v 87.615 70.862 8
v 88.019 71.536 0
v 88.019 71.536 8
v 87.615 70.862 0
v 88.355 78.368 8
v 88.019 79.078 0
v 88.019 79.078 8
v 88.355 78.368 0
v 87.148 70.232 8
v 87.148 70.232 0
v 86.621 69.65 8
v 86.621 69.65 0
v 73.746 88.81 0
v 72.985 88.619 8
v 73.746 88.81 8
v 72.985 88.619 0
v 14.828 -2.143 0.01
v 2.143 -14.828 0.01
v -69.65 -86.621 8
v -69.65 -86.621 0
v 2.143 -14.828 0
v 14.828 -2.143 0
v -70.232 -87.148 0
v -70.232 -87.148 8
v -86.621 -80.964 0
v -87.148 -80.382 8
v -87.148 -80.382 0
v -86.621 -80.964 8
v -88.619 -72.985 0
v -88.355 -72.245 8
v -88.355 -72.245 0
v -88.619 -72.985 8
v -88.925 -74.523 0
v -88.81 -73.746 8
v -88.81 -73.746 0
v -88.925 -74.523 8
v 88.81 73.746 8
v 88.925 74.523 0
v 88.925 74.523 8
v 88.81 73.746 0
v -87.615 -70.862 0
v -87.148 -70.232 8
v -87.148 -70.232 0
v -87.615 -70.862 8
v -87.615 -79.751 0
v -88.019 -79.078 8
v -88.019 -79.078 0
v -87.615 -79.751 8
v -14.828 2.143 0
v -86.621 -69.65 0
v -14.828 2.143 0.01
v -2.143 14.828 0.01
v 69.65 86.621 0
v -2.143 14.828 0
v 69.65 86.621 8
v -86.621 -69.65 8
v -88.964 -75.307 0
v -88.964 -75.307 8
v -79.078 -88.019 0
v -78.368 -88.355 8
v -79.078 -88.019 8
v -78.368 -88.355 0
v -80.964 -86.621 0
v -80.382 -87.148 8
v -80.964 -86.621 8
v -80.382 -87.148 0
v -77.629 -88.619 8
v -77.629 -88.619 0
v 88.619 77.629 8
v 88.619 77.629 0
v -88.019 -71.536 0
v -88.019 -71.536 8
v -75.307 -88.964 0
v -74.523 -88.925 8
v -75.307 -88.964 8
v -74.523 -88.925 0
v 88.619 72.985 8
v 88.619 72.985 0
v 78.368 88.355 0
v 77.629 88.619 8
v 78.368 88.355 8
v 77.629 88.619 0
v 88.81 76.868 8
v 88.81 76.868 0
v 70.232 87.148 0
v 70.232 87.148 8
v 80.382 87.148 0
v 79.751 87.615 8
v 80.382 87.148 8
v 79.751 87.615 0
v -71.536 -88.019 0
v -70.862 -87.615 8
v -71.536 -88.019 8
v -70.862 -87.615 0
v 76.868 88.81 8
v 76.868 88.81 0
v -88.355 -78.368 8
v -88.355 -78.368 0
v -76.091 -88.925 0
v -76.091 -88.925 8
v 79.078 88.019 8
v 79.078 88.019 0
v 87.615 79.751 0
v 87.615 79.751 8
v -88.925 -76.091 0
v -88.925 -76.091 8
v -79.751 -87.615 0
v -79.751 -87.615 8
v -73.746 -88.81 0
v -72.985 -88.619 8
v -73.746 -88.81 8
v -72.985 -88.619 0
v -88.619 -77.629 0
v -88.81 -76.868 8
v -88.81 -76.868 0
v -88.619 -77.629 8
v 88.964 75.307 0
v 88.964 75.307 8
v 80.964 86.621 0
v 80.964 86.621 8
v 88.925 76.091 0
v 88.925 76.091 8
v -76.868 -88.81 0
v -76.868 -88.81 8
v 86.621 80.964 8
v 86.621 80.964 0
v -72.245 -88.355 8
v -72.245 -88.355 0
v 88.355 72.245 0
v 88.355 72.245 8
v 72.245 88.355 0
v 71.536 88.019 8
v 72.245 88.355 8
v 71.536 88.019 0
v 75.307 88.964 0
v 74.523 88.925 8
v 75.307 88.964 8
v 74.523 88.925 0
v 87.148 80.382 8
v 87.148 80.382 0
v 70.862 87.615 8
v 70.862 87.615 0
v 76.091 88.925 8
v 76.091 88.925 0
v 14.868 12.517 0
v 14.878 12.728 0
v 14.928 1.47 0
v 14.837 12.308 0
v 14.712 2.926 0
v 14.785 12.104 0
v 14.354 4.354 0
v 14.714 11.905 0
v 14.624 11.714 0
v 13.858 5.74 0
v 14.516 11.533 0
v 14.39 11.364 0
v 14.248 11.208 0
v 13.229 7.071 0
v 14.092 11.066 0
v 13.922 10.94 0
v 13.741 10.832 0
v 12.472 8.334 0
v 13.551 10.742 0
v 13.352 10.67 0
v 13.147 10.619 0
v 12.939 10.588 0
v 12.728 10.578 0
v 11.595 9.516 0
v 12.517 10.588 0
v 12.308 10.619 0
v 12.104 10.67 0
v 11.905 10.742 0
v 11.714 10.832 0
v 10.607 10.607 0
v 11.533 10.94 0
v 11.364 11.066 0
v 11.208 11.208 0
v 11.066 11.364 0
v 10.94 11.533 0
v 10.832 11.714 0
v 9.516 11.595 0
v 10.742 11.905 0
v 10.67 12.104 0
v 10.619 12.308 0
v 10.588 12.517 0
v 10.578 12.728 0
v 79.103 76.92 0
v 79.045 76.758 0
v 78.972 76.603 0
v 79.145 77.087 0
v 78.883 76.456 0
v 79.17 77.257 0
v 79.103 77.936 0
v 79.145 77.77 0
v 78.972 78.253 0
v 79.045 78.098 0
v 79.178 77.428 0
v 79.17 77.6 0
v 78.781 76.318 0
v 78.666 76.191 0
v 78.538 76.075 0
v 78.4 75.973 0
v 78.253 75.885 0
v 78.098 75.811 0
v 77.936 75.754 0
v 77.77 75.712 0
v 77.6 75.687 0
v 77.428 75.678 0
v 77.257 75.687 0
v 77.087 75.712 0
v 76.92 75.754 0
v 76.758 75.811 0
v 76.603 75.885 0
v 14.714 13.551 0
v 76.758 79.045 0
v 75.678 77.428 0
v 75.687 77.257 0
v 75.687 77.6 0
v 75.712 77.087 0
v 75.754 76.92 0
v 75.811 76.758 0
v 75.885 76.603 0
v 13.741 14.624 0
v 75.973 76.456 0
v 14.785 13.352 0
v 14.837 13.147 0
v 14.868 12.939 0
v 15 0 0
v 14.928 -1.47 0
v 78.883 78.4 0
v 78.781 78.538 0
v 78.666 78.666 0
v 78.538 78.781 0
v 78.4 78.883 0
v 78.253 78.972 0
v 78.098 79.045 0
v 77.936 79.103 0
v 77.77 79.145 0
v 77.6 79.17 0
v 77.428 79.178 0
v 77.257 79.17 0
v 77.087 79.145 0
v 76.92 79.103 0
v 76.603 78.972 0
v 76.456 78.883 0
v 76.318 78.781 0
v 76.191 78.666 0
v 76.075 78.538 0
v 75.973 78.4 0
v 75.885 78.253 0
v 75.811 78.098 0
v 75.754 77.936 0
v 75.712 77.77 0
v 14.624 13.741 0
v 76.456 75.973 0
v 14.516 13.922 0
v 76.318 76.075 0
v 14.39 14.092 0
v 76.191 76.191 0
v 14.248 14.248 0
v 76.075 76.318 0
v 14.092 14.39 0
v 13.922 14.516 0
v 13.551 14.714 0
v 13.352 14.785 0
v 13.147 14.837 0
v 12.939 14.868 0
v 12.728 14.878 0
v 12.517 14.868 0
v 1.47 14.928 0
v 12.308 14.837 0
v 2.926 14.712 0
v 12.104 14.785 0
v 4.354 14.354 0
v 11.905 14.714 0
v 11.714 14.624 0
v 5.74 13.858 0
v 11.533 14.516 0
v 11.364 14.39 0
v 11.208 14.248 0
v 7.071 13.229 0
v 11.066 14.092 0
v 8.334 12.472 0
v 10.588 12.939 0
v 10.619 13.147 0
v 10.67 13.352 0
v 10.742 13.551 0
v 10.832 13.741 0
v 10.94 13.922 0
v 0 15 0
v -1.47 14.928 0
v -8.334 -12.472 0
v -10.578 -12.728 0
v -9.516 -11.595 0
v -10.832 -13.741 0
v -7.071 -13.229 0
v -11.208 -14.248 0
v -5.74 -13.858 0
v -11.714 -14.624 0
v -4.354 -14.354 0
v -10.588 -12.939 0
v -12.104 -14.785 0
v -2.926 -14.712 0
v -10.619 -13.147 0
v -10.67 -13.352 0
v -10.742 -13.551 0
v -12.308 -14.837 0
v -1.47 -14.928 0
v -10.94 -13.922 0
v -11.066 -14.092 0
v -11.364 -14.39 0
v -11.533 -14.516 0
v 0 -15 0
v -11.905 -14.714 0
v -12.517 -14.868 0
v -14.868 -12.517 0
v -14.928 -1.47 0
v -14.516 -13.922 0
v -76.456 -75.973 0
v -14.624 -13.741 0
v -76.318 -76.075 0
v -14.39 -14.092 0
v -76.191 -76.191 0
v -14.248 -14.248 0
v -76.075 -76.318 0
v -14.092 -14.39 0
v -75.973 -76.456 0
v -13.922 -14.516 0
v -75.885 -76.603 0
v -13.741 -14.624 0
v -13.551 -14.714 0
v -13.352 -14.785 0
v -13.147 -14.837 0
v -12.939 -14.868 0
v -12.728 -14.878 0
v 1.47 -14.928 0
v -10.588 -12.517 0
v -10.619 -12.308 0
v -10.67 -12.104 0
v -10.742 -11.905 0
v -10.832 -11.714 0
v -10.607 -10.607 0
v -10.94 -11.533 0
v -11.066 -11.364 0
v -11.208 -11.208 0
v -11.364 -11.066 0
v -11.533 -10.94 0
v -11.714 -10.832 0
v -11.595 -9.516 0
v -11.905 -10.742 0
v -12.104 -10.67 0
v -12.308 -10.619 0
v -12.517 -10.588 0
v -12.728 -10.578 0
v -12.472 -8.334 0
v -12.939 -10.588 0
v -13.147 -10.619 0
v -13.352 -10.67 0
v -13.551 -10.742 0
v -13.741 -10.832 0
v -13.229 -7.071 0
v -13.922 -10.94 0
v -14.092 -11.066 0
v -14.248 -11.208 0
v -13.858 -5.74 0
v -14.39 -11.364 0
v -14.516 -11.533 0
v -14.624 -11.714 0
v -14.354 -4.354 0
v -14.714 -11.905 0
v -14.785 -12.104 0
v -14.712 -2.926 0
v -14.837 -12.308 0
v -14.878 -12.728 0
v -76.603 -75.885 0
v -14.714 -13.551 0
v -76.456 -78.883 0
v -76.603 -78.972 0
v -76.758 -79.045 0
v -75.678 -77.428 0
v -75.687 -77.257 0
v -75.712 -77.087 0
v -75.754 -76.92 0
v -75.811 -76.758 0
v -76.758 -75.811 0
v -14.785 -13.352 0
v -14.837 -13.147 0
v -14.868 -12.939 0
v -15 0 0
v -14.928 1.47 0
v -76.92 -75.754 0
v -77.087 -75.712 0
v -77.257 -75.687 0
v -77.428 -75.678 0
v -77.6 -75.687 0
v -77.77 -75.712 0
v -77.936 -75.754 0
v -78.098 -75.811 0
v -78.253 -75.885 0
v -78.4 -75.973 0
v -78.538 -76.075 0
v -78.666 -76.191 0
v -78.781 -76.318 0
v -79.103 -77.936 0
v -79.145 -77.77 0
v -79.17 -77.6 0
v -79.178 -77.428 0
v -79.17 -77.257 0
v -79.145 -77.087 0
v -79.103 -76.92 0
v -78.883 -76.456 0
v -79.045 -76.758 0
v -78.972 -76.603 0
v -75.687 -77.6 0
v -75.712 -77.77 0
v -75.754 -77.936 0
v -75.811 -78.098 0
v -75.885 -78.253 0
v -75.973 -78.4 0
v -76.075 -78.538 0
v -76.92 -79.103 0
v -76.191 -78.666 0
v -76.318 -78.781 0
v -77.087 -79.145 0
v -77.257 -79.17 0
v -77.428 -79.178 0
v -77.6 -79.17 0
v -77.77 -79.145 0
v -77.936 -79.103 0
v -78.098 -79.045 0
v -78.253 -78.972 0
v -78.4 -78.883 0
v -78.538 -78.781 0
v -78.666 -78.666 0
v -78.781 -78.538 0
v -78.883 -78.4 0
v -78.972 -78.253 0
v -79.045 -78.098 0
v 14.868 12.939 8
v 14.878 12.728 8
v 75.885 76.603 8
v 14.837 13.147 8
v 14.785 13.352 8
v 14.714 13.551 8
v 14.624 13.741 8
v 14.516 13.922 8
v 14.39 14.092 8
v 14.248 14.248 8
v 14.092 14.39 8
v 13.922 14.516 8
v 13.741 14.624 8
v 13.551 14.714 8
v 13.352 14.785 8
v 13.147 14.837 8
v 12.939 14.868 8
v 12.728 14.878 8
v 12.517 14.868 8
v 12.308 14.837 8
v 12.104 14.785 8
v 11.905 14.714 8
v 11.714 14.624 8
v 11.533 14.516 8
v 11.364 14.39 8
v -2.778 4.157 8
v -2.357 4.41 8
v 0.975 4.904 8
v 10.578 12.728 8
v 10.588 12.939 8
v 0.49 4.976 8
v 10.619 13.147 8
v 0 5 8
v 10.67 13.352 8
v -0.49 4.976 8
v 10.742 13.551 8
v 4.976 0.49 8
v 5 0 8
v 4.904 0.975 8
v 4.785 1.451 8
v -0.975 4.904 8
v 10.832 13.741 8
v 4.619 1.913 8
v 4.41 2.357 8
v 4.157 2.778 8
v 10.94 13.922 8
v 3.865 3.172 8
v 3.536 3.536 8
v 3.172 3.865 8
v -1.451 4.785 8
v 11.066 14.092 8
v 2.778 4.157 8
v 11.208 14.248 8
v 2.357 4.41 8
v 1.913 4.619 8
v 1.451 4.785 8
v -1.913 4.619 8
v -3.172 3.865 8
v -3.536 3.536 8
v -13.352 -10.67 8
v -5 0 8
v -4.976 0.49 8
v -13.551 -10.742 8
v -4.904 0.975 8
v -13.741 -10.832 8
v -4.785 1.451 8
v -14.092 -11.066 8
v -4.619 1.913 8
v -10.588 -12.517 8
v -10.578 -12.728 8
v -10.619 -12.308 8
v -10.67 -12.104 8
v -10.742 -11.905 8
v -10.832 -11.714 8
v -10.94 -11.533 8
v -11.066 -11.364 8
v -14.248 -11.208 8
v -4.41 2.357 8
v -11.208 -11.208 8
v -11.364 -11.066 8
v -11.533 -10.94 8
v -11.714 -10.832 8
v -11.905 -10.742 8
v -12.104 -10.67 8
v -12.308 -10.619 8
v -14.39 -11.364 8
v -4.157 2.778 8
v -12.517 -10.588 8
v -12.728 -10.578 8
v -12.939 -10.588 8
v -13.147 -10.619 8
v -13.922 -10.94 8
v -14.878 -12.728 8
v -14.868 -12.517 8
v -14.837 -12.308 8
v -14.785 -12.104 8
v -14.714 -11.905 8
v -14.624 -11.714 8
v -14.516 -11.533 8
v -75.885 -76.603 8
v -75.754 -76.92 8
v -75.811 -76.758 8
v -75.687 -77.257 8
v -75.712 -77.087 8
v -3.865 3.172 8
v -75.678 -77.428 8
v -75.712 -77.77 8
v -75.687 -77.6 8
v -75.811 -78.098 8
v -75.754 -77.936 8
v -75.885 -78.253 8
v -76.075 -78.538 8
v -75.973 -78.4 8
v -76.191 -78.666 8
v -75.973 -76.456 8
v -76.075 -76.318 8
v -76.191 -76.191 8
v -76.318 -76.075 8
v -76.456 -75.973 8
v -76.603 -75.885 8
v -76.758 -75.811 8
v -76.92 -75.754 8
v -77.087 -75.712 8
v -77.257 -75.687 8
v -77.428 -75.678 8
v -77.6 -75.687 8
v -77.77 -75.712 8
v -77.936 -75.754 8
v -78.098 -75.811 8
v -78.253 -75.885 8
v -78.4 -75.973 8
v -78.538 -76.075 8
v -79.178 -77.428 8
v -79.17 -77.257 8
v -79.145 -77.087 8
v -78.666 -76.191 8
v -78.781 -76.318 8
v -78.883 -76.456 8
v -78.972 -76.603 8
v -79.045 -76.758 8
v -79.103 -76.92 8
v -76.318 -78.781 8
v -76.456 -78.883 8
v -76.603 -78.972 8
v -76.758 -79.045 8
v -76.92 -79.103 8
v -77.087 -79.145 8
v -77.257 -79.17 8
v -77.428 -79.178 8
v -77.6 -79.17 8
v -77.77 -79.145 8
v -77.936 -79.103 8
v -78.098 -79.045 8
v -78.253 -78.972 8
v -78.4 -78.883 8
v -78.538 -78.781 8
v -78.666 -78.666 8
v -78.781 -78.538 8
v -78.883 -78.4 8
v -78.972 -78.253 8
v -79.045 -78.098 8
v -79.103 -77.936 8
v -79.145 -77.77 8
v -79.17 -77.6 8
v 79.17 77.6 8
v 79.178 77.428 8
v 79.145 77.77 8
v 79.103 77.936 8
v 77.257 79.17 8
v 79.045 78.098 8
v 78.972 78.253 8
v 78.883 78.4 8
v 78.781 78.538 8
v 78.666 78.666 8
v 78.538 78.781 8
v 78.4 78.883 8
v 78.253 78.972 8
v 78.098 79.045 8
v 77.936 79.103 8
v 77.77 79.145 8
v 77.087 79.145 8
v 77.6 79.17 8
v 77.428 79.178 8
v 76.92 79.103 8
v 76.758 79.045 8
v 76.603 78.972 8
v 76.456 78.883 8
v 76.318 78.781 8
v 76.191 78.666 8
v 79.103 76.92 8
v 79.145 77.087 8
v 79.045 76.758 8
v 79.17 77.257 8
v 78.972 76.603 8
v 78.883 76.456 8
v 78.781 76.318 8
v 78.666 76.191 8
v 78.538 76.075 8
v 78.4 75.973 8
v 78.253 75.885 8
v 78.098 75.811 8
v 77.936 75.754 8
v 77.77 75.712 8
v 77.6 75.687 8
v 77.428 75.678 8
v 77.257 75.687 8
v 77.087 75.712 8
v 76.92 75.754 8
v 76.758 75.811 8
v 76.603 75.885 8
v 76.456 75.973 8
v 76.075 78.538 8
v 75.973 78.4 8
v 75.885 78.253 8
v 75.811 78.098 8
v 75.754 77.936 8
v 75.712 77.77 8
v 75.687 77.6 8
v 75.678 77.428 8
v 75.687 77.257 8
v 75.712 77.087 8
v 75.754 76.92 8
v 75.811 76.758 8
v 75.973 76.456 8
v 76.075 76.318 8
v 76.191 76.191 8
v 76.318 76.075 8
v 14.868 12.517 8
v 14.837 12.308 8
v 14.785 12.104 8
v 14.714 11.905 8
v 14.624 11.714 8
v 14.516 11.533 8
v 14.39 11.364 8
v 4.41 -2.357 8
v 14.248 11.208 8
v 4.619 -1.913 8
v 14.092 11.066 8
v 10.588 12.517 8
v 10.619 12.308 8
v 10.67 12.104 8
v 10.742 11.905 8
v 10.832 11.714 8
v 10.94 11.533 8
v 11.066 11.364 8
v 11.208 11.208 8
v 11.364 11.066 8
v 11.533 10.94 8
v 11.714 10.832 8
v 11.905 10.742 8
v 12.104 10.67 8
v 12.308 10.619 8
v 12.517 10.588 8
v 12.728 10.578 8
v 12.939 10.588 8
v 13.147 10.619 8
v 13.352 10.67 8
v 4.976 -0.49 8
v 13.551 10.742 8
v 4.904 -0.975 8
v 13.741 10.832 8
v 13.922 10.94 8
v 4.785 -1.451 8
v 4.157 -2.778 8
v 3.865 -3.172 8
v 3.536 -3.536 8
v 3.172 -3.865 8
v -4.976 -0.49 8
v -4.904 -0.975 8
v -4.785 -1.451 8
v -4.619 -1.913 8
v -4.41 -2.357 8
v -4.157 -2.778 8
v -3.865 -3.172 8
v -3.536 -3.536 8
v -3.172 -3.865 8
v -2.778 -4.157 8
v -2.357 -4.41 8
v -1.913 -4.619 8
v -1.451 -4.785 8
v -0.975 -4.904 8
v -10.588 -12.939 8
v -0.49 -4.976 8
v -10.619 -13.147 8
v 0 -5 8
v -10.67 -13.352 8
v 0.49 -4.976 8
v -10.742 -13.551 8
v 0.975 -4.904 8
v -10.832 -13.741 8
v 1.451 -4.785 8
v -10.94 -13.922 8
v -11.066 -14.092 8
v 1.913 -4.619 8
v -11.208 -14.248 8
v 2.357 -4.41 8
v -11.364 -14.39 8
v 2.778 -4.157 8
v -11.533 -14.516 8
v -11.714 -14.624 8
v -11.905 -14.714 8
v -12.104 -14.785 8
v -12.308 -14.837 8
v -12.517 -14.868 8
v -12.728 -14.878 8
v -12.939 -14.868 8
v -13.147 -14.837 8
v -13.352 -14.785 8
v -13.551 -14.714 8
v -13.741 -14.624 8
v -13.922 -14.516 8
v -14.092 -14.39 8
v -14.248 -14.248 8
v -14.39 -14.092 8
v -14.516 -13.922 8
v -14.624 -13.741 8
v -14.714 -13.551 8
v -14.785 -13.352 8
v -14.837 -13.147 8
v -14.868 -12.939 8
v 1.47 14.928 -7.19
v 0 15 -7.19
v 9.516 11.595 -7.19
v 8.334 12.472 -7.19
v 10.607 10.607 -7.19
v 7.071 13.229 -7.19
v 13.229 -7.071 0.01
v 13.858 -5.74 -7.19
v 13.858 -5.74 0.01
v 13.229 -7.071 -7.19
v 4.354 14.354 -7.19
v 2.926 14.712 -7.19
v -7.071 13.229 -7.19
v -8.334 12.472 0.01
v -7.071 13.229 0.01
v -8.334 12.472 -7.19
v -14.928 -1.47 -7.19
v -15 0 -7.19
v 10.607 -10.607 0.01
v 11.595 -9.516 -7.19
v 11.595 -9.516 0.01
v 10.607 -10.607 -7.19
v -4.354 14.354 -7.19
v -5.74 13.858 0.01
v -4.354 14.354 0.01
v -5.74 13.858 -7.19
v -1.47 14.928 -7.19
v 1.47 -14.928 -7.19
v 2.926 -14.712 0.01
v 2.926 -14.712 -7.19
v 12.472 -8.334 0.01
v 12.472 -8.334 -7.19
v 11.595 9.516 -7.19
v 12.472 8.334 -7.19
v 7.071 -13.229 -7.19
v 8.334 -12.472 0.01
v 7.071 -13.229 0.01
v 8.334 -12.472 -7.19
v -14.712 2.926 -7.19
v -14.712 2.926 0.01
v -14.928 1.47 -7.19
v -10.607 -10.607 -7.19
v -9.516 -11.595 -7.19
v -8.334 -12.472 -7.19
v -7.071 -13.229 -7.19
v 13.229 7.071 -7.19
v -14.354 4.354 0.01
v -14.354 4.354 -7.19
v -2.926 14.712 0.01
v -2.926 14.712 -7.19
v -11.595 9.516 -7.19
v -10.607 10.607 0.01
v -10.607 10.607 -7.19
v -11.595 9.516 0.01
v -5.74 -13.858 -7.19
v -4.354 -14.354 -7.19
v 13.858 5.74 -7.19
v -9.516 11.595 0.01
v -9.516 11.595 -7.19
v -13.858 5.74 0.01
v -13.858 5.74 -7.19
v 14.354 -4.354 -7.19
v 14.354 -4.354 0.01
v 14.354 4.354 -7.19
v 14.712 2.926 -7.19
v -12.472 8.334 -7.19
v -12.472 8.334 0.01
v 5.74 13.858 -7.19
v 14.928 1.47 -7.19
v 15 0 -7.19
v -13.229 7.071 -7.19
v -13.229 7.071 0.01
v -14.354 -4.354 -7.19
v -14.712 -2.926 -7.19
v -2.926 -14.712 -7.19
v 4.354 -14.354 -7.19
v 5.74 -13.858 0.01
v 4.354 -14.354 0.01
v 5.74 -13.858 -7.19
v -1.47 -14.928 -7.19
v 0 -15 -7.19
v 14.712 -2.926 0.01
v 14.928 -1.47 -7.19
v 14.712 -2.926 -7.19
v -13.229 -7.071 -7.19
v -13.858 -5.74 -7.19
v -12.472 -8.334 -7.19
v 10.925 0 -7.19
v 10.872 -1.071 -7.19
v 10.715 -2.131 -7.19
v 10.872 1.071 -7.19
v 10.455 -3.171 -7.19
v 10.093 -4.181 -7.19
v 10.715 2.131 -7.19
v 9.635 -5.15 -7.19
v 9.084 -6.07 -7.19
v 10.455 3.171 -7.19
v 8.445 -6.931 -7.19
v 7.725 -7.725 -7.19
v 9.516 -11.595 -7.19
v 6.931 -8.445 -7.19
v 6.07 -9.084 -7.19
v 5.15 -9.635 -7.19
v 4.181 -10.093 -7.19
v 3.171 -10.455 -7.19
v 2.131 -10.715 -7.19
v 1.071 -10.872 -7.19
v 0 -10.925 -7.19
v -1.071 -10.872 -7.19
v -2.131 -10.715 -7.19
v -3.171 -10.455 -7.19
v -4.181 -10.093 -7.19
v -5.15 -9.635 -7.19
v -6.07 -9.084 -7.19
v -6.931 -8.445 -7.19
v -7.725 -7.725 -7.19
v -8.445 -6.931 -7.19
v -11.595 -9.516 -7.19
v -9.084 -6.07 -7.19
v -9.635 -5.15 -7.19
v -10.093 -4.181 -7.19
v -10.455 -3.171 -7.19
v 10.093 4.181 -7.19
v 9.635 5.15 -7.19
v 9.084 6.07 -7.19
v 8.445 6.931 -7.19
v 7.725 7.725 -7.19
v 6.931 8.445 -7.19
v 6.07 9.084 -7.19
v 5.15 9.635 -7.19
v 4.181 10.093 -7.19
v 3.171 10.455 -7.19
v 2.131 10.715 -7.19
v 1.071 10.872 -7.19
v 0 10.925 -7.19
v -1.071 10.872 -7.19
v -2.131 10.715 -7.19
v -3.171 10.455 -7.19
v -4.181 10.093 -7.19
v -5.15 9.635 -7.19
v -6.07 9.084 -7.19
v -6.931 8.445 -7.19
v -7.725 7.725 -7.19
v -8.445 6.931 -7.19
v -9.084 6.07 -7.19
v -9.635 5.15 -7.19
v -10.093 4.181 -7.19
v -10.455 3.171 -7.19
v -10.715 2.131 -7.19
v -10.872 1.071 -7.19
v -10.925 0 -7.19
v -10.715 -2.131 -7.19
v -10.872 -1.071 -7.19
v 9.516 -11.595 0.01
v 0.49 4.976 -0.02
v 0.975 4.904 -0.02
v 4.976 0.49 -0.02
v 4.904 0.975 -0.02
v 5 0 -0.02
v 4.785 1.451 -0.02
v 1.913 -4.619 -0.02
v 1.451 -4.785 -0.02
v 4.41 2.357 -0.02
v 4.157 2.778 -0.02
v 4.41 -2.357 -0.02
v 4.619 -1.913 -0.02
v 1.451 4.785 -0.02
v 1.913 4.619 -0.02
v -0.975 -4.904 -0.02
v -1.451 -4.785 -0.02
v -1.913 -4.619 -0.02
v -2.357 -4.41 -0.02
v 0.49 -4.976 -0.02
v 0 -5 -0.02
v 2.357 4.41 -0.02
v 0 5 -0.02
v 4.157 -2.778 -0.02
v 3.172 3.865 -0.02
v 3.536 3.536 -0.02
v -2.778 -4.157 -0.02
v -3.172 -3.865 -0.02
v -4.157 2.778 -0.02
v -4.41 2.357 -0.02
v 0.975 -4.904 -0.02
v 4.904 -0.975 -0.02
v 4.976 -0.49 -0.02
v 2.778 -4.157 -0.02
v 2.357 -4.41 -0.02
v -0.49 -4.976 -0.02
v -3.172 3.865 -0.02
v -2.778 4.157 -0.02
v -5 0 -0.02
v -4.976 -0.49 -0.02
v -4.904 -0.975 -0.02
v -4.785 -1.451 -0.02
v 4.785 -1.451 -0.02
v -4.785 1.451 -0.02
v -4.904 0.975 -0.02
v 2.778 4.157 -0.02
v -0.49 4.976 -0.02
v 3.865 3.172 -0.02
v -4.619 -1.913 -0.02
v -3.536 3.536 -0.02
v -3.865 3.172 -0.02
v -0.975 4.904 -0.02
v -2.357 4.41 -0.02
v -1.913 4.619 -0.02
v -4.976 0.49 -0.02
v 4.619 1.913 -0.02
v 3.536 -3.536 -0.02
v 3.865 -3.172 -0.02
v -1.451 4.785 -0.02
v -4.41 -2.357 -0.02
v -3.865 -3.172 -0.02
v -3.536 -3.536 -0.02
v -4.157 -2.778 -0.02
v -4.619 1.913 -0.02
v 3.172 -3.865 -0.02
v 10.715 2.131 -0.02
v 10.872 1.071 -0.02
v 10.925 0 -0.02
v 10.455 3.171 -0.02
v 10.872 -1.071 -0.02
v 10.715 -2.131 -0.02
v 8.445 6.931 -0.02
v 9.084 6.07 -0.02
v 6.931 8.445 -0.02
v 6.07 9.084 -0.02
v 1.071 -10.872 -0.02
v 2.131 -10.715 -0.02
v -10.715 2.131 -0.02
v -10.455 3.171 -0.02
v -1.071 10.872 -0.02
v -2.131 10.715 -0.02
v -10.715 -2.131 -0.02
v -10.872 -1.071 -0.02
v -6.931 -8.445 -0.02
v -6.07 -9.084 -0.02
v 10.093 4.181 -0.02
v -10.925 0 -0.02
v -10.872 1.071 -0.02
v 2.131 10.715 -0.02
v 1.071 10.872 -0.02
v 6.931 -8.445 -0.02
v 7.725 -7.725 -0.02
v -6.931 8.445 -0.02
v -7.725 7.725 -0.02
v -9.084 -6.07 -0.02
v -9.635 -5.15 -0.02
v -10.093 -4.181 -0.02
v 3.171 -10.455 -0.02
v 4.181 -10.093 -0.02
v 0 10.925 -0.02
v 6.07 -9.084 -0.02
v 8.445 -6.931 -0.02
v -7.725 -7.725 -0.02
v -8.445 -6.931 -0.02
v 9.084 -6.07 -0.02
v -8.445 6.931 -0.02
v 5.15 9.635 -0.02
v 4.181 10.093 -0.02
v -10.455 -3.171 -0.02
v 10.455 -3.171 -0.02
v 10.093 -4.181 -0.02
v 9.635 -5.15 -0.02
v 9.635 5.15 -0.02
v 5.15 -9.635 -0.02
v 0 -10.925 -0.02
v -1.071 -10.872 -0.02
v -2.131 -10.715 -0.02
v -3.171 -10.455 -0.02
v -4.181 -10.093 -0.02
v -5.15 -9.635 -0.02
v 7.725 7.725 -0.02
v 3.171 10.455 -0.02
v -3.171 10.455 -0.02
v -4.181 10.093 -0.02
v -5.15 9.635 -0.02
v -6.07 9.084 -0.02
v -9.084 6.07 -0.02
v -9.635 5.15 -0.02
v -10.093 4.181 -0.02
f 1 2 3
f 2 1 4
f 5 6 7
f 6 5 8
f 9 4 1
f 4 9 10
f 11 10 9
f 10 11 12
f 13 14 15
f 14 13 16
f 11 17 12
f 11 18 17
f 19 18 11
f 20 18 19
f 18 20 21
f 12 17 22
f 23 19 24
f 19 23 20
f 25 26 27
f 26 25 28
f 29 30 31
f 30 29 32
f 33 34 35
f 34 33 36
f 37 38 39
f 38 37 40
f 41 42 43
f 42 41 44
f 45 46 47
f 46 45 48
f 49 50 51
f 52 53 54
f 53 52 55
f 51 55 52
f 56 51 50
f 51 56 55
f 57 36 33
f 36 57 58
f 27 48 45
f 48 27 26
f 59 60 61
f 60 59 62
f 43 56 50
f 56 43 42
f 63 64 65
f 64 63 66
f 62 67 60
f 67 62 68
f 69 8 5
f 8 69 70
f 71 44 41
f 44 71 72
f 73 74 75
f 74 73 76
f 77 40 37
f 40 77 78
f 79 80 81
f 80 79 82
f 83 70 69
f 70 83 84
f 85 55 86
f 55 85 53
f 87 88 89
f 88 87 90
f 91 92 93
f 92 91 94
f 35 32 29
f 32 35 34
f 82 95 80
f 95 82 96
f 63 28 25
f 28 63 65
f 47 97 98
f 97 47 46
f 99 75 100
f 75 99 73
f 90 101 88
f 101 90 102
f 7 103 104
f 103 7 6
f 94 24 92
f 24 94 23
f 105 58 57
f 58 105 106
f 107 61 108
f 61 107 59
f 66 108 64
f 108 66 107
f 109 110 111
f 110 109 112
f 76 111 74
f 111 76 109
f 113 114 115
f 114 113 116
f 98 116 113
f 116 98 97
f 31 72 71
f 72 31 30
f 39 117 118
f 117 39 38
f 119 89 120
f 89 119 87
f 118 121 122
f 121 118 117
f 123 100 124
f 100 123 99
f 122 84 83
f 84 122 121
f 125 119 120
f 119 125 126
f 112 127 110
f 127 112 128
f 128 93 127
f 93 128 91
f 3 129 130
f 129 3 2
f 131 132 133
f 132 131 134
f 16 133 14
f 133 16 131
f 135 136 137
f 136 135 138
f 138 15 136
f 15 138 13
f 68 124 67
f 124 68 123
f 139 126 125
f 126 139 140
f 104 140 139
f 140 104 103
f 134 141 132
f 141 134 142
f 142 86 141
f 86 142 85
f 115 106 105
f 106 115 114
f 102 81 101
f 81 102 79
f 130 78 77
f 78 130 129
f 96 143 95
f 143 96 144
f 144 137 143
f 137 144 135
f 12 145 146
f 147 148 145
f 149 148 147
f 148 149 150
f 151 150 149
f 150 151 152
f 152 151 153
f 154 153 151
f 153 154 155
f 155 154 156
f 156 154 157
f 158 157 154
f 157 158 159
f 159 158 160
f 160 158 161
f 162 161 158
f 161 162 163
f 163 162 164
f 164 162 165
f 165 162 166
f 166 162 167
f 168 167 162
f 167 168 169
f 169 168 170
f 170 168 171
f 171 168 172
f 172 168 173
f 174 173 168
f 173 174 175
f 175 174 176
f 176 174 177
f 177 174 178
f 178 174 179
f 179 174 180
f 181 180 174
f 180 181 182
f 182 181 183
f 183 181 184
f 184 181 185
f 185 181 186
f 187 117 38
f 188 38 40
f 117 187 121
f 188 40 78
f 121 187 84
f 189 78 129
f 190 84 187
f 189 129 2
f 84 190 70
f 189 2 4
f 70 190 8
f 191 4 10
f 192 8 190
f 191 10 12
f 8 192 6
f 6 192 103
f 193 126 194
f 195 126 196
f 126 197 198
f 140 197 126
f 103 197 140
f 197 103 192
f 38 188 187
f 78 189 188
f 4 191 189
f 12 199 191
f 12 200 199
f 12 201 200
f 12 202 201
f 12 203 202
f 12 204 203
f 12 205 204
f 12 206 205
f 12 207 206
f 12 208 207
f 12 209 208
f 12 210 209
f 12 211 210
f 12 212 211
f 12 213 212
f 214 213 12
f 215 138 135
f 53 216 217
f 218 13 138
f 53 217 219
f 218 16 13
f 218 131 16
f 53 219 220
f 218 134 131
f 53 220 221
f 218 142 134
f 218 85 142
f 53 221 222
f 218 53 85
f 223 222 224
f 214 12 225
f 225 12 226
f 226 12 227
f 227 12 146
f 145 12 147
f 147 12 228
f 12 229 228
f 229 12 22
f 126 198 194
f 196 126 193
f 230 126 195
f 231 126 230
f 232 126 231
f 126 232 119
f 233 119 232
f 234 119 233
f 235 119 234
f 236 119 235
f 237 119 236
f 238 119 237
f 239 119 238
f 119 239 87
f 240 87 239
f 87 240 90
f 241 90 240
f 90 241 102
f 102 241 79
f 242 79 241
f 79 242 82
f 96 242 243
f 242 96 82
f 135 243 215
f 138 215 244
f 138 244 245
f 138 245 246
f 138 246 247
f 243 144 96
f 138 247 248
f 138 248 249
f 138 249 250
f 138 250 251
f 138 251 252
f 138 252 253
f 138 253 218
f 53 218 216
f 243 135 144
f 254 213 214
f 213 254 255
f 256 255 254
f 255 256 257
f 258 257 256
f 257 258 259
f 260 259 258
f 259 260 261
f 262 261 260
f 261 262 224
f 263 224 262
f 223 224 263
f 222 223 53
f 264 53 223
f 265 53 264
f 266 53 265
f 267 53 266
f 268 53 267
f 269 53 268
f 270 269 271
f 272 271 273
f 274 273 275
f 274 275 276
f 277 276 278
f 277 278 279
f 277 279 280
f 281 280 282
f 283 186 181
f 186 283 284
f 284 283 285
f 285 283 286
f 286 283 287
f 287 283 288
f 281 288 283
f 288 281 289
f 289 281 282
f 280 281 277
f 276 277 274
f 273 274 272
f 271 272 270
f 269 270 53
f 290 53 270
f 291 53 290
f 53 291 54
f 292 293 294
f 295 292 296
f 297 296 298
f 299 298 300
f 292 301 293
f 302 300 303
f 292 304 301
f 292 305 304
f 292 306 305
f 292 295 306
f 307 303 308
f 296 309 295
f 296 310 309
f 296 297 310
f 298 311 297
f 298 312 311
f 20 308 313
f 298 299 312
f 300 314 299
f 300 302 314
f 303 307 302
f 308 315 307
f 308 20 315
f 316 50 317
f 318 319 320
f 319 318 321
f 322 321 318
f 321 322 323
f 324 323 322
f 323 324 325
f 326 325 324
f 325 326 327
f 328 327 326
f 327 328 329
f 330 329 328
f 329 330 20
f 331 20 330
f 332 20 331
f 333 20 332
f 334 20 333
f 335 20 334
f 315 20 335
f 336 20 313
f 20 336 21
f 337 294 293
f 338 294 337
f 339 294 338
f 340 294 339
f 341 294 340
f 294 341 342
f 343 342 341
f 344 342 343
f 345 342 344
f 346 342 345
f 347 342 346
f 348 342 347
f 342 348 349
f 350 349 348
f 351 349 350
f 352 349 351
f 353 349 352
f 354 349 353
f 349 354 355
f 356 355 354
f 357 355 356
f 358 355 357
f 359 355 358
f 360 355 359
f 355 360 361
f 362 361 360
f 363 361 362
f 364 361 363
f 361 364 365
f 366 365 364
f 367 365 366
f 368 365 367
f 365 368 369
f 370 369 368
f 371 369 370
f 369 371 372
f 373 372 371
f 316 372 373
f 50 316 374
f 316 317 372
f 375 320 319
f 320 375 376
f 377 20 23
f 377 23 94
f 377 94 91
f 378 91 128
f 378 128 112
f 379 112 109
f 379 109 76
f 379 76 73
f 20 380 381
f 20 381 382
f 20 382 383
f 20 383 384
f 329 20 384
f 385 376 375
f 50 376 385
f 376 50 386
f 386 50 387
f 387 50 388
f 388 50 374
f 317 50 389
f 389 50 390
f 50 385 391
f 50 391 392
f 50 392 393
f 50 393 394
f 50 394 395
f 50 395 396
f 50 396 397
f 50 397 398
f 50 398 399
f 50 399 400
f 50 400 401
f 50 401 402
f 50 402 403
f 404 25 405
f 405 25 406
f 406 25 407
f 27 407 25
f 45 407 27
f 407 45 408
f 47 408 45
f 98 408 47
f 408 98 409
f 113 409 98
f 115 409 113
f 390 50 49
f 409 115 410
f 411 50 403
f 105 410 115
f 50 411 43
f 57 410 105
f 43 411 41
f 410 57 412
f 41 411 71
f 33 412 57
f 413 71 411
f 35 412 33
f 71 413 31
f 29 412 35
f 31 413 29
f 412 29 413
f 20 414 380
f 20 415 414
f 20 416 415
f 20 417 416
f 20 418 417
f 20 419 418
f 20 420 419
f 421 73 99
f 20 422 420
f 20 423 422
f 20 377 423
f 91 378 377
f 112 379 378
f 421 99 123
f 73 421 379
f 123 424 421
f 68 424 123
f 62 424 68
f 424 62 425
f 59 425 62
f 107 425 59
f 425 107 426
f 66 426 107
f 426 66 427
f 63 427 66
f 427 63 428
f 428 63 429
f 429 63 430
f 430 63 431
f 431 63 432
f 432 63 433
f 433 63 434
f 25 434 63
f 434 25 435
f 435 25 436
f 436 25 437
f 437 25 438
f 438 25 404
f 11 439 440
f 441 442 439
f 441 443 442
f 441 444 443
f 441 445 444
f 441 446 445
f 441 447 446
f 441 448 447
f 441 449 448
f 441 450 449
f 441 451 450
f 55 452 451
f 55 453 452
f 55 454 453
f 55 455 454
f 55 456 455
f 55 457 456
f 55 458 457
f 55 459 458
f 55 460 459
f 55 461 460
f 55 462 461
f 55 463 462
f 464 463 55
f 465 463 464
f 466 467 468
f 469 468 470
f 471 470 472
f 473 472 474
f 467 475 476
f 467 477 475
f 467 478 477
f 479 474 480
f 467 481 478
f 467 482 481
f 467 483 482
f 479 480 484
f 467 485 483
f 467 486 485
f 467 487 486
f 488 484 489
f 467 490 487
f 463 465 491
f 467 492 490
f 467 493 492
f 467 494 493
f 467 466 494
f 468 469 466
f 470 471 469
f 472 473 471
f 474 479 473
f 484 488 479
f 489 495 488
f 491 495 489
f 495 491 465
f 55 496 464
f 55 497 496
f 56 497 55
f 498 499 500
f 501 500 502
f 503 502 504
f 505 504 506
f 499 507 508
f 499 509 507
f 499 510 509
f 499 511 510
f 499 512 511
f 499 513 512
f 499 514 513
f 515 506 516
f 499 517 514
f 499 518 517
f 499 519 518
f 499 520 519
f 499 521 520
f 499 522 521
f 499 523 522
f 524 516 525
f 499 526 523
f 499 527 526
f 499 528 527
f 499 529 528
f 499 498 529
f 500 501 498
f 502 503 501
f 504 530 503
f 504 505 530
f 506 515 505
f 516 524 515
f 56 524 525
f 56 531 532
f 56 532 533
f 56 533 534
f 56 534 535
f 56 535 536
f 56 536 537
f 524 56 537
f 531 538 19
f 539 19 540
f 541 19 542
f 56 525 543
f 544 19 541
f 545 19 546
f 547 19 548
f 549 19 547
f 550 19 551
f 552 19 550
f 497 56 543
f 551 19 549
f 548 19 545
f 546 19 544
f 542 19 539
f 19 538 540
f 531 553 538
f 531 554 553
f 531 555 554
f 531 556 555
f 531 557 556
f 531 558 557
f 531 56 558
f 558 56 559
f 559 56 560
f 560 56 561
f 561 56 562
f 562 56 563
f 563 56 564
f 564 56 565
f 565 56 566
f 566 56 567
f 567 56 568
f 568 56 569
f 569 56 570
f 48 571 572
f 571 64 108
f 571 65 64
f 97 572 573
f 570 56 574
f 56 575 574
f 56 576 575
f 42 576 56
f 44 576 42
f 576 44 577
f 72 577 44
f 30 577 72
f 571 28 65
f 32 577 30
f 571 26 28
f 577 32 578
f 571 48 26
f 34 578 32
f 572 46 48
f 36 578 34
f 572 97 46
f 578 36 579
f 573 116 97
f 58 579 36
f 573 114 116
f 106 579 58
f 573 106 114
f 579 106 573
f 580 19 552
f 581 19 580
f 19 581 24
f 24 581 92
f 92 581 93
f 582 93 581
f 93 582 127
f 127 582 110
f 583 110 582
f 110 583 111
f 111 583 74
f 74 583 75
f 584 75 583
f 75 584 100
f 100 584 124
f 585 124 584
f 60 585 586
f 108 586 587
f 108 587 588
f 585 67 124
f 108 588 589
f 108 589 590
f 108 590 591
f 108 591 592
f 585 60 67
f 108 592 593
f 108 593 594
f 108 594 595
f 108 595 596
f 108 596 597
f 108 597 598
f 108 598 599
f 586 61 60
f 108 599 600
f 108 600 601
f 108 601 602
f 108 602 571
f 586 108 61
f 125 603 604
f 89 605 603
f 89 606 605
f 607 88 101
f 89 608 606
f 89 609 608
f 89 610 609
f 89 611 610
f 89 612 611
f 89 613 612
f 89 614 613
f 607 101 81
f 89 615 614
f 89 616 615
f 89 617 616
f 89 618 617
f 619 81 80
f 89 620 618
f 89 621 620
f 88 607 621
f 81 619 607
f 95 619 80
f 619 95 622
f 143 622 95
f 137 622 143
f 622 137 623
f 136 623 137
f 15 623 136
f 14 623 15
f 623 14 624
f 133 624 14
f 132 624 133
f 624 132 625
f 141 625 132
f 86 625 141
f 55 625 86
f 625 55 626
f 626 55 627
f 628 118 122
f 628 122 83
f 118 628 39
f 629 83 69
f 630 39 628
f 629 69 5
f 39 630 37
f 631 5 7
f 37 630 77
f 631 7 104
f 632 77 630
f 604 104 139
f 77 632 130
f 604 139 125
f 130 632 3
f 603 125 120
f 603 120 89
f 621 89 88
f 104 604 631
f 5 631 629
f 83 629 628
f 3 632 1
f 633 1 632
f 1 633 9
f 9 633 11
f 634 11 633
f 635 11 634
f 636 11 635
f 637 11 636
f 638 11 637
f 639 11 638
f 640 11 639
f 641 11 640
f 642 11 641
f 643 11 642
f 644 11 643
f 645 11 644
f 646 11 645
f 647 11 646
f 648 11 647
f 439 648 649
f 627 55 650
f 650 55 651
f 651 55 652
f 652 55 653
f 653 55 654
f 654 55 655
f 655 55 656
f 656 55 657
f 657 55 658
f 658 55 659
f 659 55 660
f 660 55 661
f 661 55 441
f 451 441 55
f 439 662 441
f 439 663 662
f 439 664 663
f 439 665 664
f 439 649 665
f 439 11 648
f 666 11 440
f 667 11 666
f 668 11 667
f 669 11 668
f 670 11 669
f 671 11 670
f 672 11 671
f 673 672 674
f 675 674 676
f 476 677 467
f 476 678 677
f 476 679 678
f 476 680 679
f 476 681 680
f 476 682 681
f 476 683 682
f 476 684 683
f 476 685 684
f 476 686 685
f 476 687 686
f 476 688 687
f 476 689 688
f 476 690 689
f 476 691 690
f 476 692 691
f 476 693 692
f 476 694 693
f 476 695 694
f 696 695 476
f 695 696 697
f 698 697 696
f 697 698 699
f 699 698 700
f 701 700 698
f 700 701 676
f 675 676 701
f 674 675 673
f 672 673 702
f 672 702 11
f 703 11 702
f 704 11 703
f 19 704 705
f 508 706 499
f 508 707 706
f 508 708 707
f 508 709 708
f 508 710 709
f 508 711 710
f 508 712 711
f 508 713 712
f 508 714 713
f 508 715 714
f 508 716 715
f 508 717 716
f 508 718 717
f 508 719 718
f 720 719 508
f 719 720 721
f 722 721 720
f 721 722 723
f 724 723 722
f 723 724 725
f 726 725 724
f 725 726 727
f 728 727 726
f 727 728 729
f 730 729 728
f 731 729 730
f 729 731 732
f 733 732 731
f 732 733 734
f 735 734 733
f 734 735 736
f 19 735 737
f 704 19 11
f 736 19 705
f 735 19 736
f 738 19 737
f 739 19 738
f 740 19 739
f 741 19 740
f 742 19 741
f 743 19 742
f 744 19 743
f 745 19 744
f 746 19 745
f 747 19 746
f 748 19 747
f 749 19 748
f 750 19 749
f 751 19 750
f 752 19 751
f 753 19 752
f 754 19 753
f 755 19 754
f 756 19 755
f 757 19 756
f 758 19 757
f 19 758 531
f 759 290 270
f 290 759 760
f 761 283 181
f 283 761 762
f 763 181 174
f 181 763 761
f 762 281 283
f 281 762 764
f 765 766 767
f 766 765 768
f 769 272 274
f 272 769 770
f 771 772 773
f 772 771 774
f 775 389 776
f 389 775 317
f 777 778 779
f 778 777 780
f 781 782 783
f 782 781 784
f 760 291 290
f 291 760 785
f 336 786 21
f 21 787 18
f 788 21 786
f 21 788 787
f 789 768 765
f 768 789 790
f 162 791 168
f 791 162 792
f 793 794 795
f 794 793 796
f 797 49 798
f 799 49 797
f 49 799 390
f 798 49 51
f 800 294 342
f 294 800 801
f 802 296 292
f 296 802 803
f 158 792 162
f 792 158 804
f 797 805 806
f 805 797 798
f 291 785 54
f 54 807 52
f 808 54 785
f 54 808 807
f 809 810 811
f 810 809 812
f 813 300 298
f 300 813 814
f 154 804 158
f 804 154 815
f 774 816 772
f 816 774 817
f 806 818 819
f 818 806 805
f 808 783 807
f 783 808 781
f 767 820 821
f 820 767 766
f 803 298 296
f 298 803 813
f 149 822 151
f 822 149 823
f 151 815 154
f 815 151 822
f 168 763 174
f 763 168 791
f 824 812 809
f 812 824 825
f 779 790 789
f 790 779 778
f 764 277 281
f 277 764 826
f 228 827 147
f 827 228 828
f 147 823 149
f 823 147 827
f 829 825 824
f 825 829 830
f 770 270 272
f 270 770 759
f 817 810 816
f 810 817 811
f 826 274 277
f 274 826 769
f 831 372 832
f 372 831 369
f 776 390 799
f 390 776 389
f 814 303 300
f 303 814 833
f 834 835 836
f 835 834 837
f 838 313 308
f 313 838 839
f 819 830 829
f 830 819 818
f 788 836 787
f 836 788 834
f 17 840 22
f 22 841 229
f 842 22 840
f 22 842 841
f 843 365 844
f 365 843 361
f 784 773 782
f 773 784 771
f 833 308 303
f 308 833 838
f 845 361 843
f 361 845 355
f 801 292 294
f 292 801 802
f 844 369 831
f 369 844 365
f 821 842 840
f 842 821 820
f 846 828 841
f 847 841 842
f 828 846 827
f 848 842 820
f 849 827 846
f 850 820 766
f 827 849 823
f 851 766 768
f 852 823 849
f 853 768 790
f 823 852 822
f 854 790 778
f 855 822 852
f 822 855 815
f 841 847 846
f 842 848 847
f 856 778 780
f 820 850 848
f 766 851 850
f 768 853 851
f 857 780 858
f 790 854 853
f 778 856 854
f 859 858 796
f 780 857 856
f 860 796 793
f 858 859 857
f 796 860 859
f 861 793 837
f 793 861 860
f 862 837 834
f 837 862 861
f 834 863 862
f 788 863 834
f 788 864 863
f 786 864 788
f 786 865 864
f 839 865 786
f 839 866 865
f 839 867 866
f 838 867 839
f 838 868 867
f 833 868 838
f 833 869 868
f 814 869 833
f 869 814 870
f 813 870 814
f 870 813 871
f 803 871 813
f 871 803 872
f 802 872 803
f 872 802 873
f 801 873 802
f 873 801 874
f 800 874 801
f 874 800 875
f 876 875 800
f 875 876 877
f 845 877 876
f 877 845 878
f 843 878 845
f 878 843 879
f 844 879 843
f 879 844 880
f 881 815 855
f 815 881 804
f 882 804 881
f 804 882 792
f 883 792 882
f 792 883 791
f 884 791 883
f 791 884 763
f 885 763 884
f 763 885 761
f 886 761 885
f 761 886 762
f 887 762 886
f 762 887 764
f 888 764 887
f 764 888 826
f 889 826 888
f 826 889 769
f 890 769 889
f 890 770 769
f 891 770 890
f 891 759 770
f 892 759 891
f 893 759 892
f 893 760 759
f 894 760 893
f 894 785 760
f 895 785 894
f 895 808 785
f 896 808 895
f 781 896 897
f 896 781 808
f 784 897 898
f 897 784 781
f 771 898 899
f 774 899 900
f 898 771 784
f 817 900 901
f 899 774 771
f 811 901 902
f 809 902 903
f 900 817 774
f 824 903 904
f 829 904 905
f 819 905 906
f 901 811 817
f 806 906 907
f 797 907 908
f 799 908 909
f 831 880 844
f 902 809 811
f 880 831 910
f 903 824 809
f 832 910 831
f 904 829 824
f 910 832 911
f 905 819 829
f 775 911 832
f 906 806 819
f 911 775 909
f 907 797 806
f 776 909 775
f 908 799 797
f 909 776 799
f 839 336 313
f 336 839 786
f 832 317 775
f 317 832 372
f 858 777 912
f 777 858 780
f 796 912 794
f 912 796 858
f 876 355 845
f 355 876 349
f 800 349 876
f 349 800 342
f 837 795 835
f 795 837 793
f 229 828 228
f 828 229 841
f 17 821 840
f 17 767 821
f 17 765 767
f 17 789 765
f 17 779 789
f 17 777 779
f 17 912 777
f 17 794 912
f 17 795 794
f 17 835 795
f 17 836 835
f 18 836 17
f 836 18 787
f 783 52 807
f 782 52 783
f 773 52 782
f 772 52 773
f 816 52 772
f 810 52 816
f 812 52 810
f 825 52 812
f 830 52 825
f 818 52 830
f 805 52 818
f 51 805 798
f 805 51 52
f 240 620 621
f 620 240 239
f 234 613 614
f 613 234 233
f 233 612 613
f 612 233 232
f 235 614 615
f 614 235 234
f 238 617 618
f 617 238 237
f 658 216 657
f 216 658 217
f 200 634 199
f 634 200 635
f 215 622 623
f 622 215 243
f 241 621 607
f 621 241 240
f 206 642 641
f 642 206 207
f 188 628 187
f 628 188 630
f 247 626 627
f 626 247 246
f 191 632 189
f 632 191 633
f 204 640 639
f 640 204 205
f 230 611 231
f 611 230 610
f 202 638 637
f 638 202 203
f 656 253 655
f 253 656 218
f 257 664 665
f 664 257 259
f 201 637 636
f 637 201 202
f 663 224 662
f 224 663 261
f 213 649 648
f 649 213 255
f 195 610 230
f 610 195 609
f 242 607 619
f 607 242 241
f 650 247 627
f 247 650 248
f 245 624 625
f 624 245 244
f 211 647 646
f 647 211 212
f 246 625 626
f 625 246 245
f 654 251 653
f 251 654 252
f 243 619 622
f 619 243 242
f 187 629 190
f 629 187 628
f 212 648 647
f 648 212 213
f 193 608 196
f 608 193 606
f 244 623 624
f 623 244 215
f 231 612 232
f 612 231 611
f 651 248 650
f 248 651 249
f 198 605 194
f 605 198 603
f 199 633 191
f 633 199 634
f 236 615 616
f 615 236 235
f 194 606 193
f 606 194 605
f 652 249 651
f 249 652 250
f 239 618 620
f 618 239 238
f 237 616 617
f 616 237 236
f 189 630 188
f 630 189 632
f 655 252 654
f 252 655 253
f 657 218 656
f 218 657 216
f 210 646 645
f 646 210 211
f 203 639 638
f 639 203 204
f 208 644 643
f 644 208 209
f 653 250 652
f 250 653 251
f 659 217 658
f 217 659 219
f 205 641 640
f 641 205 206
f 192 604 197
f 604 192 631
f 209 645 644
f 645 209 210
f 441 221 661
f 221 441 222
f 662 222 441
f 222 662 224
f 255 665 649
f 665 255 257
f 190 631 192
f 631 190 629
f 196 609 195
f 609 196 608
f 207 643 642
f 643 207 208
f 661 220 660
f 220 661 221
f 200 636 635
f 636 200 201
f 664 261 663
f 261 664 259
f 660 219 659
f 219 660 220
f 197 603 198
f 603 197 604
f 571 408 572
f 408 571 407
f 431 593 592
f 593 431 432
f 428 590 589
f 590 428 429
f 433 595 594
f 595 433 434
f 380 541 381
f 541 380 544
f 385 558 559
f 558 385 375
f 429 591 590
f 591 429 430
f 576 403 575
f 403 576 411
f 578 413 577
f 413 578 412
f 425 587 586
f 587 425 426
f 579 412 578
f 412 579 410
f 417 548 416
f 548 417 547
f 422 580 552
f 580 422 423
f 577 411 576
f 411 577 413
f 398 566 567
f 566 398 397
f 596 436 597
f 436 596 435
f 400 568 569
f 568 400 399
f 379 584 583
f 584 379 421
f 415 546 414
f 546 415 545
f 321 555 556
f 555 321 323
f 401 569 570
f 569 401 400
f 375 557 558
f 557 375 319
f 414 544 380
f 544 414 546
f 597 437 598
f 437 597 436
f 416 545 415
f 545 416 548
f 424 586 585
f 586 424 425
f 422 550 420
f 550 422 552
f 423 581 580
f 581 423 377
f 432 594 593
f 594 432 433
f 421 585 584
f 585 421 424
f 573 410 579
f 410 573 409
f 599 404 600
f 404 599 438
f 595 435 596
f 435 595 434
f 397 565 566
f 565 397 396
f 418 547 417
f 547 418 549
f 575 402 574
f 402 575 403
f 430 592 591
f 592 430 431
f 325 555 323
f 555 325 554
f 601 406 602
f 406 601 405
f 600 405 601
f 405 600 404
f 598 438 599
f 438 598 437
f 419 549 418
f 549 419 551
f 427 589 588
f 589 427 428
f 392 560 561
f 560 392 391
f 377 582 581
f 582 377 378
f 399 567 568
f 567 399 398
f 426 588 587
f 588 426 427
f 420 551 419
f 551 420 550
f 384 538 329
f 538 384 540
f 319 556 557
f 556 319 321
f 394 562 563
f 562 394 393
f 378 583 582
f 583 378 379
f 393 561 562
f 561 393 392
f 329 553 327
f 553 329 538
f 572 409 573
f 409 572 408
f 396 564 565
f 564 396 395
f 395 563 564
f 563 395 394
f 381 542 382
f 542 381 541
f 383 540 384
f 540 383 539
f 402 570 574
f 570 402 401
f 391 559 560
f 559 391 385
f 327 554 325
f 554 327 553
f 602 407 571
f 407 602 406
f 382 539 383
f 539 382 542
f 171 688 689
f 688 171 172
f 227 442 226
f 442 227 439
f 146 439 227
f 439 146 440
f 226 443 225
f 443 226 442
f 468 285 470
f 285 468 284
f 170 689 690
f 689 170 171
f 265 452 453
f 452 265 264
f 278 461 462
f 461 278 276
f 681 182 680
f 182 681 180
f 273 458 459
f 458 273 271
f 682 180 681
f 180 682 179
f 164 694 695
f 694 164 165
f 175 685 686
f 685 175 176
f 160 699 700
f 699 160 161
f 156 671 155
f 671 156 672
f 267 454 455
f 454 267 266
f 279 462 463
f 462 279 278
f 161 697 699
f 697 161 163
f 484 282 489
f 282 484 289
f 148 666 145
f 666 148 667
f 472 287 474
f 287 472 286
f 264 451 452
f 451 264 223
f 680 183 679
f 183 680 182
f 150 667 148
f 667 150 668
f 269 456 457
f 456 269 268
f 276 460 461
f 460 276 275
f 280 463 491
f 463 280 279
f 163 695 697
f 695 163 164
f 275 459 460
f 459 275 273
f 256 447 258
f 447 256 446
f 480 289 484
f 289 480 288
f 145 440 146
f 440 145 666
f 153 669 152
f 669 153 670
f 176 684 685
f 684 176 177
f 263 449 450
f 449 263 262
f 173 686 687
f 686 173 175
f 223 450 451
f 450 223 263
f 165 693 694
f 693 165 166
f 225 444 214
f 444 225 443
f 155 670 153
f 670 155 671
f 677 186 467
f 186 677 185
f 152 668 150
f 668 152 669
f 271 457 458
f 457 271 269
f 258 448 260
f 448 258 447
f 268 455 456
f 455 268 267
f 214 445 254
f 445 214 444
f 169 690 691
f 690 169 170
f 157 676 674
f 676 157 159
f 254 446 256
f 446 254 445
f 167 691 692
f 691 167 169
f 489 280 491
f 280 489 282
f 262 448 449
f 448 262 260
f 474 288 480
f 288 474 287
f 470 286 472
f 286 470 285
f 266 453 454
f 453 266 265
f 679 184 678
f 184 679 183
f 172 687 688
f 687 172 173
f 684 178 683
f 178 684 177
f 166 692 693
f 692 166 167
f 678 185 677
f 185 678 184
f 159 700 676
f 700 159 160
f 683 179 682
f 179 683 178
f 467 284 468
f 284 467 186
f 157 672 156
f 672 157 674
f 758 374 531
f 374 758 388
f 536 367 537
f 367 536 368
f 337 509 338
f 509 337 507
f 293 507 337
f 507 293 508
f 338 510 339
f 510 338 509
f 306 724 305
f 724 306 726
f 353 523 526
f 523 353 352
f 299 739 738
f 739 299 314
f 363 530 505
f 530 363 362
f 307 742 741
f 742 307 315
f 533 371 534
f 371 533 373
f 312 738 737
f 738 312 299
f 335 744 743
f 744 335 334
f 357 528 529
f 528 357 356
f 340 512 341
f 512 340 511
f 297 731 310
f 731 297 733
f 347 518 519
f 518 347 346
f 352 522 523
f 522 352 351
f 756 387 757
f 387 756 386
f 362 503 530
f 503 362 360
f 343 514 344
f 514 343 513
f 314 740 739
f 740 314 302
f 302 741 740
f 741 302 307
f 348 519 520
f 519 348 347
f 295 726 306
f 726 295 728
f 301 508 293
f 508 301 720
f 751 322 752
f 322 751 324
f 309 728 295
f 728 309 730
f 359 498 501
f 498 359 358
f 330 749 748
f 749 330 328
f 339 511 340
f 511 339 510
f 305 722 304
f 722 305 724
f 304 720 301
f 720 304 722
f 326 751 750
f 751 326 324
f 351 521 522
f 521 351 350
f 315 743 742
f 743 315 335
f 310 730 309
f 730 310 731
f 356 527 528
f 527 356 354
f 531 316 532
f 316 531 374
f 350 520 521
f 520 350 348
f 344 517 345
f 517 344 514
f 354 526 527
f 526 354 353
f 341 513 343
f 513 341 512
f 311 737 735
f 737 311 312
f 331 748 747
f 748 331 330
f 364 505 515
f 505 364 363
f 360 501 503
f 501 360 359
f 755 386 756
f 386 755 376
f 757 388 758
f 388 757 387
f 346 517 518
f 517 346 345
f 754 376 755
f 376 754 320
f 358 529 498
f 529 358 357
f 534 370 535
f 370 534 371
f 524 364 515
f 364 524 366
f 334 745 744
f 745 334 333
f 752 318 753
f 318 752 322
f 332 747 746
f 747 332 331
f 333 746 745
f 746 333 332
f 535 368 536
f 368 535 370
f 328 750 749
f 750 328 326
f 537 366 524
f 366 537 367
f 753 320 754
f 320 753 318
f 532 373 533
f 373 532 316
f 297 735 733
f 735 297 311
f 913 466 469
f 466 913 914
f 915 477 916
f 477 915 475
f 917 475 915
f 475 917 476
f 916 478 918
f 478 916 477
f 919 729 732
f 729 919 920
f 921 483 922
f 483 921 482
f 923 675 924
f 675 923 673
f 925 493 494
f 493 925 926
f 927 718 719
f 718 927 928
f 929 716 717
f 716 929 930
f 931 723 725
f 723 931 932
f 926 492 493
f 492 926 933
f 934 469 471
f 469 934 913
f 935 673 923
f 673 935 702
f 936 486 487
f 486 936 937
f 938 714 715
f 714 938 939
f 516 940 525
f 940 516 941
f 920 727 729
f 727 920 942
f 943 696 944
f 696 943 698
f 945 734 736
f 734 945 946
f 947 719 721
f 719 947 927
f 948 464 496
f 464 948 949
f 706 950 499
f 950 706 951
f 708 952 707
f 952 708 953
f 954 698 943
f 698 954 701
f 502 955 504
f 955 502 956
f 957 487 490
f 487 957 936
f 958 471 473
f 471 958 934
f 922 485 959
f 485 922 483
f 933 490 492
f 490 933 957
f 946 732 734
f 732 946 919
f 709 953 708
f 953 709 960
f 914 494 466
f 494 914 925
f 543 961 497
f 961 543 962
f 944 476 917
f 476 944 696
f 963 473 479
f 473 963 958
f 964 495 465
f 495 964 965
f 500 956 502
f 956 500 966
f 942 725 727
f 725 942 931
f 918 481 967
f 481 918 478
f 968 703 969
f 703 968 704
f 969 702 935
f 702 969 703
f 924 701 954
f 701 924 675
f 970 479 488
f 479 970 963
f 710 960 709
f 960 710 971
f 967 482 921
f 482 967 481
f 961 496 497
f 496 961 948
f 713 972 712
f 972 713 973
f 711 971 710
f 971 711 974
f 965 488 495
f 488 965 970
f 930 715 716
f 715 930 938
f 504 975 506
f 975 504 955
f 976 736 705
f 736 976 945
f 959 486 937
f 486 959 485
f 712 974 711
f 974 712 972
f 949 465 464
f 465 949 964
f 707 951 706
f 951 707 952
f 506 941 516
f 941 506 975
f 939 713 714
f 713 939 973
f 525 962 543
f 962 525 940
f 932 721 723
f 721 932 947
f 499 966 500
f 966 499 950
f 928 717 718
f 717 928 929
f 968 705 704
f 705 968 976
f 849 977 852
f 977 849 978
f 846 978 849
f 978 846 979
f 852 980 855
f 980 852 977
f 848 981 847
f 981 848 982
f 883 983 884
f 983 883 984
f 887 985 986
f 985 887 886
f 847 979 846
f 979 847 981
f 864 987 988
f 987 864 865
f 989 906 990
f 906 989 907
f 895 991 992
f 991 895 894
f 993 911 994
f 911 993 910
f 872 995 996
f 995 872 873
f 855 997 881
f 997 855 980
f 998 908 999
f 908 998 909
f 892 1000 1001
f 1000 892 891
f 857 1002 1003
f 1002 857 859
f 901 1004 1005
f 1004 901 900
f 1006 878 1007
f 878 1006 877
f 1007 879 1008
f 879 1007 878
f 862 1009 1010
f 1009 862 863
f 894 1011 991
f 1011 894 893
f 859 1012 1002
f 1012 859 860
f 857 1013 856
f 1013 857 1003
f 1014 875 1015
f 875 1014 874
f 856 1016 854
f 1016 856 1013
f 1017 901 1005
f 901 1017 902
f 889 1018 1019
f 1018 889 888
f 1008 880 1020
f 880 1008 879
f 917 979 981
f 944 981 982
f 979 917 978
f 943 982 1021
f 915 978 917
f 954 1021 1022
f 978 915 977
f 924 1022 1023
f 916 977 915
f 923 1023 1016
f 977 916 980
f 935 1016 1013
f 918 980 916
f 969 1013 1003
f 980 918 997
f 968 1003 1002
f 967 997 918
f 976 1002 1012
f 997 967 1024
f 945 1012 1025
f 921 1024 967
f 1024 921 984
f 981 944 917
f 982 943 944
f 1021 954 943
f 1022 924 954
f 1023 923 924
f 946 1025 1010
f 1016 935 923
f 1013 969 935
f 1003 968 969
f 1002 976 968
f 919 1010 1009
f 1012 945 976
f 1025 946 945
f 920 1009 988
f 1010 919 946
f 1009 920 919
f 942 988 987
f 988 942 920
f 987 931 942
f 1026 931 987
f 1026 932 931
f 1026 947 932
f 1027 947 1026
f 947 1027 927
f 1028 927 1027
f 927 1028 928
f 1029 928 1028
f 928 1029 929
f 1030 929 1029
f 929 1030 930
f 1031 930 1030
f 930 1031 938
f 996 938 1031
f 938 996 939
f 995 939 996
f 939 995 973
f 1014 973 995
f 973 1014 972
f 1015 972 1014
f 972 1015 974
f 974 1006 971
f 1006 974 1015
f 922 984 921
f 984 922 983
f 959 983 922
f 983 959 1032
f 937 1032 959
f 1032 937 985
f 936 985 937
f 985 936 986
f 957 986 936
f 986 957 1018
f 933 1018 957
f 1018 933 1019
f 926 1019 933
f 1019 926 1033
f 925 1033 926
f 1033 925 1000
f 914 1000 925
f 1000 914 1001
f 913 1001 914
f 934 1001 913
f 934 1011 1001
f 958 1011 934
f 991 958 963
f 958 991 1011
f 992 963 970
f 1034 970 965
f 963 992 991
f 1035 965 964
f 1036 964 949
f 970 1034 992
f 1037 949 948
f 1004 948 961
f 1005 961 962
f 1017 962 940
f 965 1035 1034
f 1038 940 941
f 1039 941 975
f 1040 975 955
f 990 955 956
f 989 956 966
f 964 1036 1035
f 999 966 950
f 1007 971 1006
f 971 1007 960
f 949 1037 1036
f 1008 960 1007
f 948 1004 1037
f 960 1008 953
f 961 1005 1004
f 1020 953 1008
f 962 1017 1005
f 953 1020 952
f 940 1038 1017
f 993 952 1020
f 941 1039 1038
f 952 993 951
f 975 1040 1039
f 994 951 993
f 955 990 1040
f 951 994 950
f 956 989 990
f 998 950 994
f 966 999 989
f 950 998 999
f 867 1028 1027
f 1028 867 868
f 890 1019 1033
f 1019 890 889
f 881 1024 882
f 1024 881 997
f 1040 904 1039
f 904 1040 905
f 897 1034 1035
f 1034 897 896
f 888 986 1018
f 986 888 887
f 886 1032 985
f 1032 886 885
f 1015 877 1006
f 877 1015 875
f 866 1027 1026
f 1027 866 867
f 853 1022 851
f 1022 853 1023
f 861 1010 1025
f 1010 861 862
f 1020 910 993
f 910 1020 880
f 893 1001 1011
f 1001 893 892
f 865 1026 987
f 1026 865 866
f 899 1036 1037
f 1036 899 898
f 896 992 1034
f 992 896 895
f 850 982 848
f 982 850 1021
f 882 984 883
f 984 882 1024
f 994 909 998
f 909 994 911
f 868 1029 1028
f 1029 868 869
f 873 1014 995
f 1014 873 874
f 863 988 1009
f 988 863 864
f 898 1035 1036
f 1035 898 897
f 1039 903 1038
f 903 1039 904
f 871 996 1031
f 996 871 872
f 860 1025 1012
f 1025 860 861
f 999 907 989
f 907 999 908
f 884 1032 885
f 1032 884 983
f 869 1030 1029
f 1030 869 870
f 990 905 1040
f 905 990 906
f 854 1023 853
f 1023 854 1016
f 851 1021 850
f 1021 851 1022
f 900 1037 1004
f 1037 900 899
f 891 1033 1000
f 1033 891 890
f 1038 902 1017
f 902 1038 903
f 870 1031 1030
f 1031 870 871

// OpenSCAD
// Gen-CS — front BEARING BRIDGE (bar endbell, 2026-10-10): a 608 boss on a 24 mm wide bar that spans the
// two frame rods at 45 deg and 45+180 deg (R = flange_bolt_r). The front bridge uses the rods at 45/225 deg, the rear
// bridge the rods at 135/315 deg, so the two bridges cross at 90 deg and the stator is held at 4 points.
// A bar instead of a full disc is what lets this big-ring kit fit ONE 410 mm plate. Print flat face DOWN (boss up, no supports).
// Brace holes (temporary M4 jack rods, R = brace_r) sit on the bar axis.
include <parameters.scad>;
$fn = 64;
bar_w = 24;
bar_len = 2 * (flange_bolt_r + 9);
module bar_2d() { offset(r=8) offset(delta=-8) square([bar_len, bar_w], center=true); }
difference() {
    rotate([0, 0, 45]) union() {
        linear_extrude(endbell_thick) bar_2d();
        translate([0, 0, -bearing_h + 0.01]) cylinder(d=30, h=bearing_h);
    }
    translate([0, 0, -bearing_h - 0.1]) cylinder(d=endbell_shaft_clear, h=50);
    translate([0, 0, -bearing_h - 0.02]) cylinder(d=bearing_d, h=bearing_h);
    for (s = [0, 180]) rotate([0, 0, 45 + s]) translate([flange_bolt_r, 0, -20]) cylinder(d=m3_clear, h=60);
    for (a = brace_angles) translate([brace_r*cos(a), brace_r*sin(a), -20]) cylinder(d=brace_d, h=50);
}
